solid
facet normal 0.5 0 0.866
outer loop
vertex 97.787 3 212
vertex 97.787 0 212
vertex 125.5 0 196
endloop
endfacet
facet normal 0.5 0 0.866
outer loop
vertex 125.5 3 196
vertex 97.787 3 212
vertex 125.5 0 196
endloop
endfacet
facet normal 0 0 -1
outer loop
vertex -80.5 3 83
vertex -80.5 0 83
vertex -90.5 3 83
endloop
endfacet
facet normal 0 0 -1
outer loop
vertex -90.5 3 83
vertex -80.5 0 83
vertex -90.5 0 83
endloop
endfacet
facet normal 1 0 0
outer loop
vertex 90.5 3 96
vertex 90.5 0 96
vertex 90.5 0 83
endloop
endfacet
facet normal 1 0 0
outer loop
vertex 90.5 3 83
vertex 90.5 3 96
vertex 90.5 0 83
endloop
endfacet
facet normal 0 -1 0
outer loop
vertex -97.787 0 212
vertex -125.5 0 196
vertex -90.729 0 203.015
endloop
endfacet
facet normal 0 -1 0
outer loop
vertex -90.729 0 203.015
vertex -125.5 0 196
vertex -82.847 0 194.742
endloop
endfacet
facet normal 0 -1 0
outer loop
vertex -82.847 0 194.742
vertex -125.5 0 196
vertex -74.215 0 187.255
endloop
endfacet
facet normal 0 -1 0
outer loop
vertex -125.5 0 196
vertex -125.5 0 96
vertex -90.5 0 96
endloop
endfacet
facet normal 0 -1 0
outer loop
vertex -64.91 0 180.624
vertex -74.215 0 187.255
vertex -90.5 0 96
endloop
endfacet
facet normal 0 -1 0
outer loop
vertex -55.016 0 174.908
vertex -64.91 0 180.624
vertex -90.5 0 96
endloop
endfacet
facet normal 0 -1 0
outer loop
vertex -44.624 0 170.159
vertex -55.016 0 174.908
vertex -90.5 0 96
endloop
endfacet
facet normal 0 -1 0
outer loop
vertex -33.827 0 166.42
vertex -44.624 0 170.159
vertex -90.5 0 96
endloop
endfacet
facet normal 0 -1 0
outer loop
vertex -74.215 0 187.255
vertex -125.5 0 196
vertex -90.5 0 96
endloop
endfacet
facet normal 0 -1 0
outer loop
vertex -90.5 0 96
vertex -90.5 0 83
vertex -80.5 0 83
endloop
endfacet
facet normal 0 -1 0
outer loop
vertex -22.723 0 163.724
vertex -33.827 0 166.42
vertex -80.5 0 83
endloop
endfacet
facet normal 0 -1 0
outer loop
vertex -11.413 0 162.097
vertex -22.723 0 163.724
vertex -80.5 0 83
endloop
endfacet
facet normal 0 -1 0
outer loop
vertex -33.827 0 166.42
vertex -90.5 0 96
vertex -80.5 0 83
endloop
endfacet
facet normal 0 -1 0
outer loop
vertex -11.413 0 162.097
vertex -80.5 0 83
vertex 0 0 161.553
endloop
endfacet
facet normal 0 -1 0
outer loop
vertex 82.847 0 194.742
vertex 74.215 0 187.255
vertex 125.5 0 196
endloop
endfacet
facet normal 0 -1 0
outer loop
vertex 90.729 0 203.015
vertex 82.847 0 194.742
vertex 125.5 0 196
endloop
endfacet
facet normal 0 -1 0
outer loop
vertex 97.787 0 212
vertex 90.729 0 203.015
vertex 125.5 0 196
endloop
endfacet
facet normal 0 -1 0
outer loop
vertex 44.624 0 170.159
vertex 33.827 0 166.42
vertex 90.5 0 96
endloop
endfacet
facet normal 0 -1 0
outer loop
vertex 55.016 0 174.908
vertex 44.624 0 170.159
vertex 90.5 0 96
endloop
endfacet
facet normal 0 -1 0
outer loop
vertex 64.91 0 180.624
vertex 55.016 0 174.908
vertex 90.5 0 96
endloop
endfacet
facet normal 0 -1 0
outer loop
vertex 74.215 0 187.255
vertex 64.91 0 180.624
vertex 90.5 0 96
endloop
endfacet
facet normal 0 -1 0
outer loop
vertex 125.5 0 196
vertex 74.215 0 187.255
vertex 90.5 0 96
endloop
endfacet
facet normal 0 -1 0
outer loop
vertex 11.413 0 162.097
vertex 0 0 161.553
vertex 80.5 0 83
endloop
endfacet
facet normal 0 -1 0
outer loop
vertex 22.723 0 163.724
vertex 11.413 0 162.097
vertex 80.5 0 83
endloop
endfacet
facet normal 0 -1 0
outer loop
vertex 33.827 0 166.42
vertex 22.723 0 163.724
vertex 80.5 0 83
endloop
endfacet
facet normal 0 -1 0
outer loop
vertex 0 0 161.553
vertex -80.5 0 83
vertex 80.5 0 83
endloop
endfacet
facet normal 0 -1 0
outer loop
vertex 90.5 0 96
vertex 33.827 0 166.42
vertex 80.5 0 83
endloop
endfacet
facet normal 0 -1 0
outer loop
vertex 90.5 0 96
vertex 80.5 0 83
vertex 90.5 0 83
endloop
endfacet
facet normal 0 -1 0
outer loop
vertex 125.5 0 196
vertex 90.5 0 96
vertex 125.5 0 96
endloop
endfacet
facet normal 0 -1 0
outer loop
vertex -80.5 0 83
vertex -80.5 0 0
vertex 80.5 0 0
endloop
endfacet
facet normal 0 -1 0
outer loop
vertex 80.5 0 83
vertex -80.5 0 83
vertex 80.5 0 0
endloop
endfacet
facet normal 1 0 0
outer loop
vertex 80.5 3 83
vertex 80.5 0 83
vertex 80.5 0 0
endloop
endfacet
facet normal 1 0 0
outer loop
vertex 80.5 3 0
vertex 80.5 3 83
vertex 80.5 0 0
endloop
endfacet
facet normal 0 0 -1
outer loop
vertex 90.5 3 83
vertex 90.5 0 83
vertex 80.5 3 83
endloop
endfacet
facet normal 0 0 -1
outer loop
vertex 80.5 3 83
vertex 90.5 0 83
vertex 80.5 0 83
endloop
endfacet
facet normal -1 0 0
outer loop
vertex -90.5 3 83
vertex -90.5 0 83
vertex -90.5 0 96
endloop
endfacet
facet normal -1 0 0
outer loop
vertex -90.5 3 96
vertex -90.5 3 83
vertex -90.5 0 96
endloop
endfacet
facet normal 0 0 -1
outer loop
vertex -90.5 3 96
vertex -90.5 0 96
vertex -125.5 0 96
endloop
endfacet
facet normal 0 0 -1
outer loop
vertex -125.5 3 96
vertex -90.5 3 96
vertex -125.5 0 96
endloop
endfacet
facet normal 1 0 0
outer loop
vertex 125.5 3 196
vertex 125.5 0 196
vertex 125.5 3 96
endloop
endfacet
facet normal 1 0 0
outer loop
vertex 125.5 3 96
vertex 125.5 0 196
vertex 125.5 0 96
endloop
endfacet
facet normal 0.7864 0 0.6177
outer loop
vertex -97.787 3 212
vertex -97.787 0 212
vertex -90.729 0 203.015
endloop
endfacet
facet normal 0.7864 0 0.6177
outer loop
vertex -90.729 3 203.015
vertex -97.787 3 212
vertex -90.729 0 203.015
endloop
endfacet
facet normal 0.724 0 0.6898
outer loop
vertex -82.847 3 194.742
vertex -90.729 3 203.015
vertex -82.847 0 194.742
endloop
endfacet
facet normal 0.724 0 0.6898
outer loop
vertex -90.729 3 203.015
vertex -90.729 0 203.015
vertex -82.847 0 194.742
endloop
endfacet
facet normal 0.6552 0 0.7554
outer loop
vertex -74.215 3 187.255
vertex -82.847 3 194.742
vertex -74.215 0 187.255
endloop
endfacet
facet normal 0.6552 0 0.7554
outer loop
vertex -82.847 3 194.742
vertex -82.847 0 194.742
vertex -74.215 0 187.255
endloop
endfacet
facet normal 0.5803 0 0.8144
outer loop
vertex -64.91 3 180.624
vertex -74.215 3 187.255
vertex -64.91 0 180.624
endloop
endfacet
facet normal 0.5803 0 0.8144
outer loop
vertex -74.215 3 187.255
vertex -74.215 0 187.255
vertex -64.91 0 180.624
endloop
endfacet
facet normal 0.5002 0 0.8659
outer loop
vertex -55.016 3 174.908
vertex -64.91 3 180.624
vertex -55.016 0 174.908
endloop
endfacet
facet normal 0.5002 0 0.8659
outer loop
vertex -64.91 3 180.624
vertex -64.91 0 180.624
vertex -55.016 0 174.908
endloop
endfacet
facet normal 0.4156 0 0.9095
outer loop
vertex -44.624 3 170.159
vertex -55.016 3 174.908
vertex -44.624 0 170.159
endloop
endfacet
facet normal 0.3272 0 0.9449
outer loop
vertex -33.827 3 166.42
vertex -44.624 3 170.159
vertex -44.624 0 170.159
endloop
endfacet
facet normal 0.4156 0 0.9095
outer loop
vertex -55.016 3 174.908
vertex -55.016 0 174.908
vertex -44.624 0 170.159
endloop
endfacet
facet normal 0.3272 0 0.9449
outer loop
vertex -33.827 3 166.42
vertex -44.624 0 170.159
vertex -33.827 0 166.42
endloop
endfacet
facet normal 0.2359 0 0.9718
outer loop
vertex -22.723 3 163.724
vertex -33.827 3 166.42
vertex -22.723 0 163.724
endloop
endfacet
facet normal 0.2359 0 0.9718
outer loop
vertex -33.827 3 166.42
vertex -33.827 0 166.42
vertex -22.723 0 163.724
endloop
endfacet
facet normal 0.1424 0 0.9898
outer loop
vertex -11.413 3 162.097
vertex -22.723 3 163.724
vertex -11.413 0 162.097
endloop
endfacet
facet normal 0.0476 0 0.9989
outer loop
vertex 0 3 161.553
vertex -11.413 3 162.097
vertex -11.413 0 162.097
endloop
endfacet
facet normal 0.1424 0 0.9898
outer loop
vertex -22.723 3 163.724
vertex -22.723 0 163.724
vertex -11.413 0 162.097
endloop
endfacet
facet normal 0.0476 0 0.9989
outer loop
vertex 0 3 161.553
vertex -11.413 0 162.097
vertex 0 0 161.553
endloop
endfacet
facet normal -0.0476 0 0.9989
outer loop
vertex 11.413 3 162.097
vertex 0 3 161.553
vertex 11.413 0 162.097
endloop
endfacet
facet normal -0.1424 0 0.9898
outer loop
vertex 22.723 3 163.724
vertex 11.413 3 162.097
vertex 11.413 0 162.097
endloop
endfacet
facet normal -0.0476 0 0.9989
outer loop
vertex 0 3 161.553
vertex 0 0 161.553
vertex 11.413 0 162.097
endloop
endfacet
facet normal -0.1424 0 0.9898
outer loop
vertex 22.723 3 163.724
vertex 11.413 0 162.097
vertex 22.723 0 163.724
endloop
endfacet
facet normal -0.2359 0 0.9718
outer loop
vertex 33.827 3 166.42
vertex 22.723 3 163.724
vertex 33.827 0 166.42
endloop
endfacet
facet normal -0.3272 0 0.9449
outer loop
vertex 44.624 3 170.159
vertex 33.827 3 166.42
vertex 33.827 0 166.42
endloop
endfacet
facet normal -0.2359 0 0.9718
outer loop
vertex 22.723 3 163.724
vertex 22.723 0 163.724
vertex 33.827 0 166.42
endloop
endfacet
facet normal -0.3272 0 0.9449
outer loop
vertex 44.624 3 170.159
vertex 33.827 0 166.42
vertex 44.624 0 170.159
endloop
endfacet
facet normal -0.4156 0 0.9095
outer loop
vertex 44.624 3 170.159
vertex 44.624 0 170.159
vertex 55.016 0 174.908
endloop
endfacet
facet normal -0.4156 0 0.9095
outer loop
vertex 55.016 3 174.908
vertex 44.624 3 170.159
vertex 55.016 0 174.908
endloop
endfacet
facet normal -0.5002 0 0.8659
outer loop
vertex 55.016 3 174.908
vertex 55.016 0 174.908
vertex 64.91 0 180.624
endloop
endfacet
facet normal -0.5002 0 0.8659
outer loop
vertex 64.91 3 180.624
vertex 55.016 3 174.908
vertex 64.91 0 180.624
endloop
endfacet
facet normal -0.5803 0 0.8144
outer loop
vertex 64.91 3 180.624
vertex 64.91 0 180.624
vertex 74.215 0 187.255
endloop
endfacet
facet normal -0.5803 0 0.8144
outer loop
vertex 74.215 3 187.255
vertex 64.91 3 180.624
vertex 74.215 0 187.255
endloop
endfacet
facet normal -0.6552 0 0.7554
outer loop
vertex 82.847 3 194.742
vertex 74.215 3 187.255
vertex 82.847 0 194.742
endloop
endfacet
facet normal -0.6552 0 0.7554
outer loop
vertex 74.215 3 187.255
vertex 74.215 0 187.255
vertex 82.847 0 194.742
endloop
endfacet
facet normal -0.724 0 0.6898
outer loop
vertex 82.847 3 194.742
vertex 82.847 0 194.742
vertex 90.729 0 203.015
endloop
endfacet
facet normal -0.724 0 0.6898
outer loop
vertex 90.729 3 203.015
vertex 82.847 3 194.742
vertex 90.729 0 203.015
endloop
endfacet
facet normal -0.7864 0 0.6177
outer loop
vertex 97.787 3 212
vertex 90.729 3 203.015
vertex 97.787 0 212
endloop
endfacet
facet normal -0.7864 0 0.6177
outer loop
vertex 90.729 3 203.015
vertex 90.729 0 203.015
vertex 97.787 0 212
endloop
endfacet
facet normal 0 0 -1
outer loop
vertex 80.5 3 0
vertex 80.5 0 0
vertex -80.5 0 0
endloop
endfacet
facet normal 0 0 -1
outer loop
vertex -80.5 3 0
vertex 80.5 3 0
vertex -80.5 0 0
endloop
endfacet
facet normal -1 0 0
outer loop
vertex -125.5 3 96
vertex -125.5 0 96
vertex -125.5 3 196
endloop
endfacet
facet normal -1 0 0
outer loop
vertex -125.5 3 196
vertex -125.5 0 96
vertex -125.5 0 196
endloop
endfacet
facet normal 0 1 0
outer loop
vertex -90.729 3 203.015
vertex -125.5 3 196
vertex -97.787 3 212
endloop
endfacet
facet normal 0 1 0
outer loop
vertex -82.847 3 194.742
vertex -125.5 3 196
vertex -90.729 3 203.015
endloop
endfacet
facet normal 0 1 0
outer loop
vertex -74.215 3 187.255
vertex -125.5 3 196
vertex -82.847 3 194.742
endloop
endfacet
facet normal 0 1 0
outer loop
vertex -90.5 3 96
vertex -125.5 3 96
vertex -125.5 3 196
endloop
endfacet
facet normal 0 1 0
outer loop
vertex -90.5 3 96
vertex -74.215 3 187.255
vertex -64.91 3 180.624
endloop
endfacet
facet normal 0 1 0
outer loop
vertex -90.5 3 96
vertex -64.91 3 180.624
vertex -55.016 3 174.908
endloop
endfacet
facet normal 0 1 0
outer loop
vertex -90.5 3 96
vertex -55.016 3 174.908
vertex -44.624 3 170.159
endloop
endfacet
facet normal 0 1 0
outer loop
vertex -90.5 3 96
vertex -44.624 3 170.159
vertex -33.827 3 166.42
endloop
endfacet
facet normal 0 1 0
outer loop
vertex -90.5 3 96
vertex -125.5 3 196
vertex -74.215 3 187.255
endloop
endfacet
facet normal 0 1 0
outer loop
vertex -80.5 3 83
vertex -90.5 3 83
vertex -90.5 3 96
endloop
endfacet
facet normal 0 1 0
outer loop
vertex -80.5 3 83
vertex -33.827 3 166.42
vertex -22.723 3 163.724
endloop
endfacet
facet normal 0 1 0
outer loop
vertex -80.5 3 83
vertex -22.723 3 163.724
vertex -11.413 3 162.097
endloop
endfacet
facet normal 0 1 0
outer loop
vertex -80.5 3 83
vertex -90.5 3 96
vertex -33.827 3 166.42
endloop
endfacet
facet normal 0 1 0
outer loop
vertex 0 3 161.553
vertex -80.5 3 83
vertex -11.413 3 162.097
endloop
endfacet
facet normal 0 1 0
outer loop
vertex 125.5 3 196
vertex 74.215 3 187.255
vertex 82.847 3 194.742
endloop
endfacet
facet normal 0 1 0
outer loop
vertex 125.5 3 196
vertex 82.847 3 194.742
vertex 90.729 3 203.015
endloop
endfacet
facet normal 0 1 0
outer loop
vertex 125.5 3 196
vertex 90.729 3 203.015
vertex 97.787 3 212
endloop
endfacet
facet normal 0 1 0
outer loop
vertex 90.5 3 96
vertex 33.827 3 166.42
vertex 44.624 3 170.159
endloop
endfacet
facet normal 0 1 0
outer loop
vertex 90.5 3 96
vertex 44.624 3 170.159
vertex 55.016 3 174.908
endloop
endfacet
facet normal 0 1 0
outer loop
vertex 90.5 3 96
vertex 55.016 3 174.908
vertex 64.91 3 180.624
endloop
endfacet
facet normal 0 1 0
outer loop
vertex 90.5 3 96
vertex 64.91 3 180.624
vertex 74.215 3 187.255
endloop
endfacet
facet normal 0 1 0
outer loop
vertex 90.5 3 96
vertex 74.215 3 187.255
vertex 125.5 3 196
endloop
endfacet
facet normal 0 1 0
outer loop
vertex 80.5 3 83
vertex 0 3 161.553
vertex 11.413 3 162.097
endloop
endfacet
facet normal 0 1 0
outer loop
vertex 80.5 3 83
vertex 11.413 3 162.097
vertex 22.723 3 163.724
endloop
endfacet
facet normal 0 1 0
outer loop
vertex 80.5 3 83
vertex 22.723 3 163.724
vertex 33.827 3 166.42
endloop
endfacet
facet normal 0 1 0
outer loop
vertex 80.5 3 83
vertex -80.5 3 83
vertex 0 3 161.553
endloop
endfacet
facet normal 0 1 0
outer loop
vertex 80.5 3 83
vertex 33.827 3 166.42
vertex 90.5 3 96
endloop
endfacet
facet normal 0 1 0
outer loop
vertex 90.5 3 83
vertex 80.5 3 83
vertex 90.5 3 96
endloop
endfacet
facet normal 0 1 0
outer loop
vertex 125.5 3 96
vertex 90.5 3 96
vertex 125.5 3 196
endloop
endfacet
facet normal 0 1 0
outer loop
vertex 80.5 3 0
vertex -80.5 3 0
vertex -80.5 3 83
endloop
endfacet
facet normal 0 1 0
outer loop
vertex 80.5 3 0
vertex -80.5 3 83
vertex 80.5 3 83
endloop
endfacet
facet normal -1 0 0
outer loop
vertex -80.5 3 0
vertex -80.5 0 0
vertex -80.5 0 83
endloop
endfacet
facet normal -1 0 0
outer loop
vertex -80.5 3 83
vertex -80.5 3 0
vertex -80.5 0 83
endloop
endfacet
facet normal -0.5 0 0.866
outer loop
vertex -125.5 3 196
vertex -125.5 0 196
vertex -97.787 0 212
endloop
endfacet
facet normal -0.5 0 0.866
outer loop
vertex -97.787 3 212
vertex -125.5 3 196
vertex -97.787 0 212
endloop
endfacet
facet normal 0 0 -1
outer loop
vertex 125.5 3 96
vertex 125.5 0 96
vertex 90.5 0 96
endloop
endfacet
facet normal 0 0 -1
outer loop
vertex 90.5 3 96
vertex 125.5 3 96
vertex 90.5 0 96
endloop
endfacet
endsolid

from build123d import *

# Parameters (mm, degrees)
EXTRUSION1_DEPTH = 3


with BuildPart() as part:
    # Esquisse1 → Extrusion1 (new body)
    with BuildSketch(Plane(origin=(0, 0, 0), x_dir=(1, 0, 0), z_dir=(0, 1, 0))):
        with BuildLine():
            Line((80.5, 0), (-80.5, 0))
            Line((-80.5, 0), (-80.5, -83))
            Line((-80.5, -83), (-90.5, -83))
            Line((-90.5, -83), (-90.5, -96))
            Line((-90.5, -96), (-125.5, -96))
            Line((-125.5, -96), (-125.5, -196))
            Line((-125.5, -196), (-97.787187079, -212))
            ThreePointArc((-97.787187079, -212), (0, -161.553332366), (97.787187079, -212))
            Line((97.787187079, -212), (125.5, -196))
            Line((125.5, -196), (125.5, -96))
            Line((125.5, -96), (90.5, -96))
            Line((90.5, -96), (90.5, -83))
            Line((90.5, -83), (80.5, -83))
            Line((80.5, -83), (80.5, 0))
        make_face()
    extrude(amount=EXTRUSION1_DEPTH)


solid = part.part
